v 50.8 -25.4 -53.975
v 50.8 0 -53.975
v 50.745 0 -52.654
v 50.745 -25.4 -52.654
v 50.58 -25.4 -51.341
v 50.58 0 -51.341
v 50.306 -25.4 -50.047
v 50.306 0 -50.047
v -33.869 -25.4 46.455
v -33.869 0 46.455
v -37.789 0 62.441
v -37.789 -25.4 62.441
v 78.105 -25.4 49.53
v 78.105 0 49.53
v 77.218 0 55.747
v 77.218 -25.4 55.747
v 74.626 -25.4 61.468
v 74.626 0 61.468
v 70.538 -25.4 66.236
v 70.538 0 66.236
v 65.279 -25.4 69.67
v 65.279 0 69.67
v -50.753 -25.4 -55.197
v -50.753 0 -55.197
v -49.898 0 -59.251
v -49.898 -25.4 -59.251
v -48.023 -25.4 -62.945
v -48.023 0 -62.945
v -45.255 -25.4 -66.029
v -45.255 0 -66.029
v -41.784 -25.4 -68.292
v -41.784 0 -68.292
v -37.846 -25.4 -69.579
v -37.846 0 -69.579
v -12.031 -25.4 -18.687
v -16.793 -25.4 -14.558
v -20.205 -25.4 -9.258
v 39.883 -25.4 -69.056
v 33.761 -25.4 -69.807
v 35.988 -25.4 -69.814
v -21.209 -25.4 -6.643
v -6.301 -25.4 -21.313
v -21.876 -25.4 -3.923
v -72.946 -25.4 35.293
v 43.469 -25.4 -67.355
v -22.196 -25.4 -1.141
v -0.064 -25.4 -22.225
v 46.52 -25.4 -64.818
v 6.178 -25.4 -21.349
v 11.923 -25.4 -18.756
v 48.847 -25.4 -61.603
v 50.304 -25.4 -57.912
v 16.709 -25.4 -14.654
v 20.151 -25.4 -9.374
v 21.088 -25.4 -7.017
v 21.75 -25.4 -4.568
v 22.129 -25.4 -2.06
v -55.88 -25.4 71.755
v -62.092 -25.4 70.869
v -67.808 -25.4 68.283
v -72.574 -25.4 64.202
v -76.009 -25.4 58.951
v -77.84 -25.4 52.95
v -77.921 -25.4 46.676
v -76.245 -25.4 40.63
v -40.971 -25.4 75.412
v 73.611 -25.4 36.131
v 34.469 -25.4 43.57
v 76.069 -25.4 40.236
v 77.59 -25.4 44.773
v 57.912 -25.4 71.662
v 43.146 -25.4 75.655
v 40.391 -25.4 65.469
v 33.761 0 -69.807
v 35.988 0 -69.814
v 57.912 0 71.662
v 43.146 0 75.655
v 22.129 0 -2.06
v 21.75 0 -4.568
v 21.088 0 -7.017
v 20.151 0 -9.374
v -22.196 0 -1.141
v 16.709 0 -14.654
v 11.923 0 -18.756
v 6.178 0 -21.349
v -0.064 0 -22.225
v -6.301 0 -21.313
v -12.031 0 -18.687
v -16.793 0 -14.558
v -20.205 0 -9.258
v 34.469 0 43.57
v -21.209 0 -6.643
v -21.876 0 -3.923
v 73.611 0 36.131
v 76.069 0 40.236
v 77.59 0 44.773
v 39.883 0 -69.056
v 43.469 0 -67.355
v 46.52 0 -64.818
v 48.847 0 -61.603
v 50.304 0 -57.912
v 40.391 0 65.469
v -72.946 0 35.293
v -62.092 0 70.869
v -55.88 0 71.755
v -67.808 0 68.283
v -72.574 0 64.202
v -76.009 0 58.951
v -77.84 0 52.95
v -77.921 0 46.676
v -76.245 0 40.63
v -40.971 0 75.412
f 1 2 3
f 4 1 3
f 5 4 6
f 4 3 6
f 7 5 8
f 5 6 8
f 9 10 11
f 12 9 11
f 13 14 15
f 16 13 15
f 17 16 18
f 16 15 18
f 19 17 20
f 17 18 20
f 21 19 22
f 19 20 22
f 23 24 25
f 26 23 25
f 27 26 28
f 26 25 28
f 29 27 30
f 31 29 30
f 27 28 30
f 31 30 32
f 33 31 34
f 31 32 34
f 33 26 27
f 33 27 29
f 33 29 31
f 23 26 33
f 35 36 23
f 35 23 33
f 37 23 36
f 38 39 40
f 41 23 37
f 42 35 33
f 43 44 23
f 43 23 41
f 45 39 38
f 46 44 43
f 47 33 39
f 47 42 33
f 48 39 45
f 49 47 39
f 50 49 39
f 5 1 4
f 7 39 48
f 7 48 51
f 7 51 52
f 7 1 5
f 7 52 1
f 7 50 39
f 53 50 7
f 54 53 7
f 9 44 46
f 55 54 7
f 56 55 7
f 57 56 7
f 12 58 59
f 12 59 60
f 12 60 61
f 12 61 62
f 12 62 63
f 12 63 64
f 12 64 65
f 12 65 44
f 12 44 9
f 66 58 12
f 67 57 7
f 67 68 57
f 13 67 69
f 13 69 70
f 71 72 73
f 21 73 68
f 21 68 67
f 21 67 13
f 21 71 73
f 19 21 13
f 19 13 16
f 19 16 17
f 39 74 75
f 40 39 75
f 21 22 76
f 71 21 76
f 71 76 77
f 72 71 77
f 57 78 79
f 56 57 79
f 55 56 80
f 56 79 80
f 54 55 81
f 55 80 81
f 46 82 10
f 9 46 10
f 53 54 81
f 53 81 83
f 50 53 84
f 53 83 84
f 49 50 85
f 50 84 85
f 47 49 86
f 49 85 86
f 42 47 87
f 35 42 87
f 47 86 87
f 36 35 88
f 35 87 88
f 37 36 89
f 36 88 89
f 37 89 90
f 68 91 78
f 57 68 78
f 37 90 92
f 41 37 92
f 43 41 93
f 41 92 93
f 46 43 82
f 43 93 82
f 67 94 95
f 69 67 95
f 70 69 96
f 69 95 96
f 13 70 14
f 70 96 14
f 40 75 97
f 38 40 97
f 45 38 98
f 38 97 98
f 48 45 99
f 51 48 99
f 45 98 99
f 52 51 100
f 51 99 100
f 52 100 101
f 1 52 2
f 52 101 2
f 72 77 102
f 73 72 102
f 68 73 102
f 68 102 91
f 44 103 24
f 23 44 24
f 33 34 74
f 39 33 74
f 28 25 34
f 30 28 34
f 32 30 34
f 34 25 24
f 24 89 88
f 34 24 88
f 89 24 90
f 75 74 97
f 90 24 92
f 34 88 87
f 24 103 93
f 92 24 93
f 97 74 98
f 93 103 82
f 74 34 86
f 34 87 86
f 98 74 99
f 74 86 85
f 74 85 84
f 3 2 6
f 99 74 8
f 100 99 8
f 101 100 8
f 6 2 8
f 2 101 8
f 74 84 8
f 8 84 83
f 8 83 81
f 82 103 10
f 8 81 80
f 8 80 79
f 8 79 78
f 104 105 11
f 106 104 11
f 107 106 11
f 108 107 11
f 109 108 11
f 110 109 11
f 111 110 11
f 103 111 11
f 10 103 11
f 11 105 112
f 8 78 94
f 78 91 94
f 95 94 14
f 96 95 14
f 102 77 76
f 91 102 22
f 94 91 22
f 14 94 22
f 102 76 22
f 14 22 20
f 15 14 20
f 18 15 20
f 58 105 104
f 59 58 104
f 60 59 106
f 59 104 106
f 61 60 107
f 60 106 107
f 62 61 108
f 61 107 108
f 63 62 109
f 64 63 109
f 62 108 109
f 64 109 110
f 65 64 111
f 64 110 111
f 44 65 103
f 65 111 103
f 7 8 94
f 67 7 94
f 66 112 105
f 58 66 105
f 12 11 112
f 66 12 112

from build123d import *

# Parameters (mm, degrees)
F1_DEPTH = 25.4


with BuildPart() as f1:
    # F0 (on Front) → F1 (new body)
    with BuildSketch(Plane.XZ):
        with BuildLine():
            ThreePointArc((-55.88, 71.755), (-45.7062069243, 69.2896700239), (-37.7894898478, 62.4406183985))
            Line((-37.7894898478, 62.4406183985), (-40.9707072614, 75.4116006232))
            Line((-40.9707072614, 75.4116006232), (-55.88, 71.755))
        make_face()
        with BuildLine():
            ThreePointArc((20.1514706795, -9.3738388323), (-0.0637628383, -22.224908533), (-20.2049252332, -9.2580571029))
            ThreePointArc((-20.2049252332, -9.2580571029), (-21.5852935507, -5.293933068), (-22.1956935913, -1.1409693254))
            Line((-22.1956935913, -1.1409693254), (-33.8688111264, 46.4545830573))
            ThreePointArc((-33.8688111264, 46.4545830573), (-49.7758218318, 28.1597020636), (-72.9459940838, 35.2926382032))
            Line((-72.9459940838, 35.2926382032), (-50.7529312723, -55.1965631947))
            ThreePointArc((-50.7529312723, -55.1965631947), (-35.536234837, -38.1117715463), (-19.05, -53.975))
            ThreePointArc((-19.05, -53.975), (-22.7428404887, -64.153929936), (-32.1033057816, -69.5972170878))
            Line((-32.1033057816, -69.5972170878), (33.760778806, -69.8072523354))
            ThreePointArc((33.760778806, -69.8072523354), (22.7534984393, -43.7833281666), (50.3064695665, -50.0474029008))
            Line((50.3064695665, -50.0474029008), (73.6114514871, 36.1305129516))
            ThreePointArc((73.6114514871, 36.1305129516), (51.7301219198, 27.695872197), (34.4690239948, 43.5700728609))
            Line((34.4690239948, 43.5700728609), (22.1293157515, -2.0600993596))
            ThreePointArc((22.1293157515, -2.0600993596), (21.4543450512, -5.8018706833), (20.1514706795, -9.3738388323))
        make_face()
        with BuildLine():
            Line((43.1457490814, 75.6551475002), (40.391048509, 65.4687266339))
            ThreePointArc((40.391048509, 65.4687266339), (48.4732019865, 70.4844737034), (57.912088459, 71.6619055098))
            Line((57.912088459, 71.6619055098), (43.1457490814, 75.6551475002))
        make_face()
        with BuildLine():
            Line((40.391048509, 65.4687266339), (34.4690239948, 43.5700728609))
            ThreePointArc((34.4690239948, 43.5700728609), (51.7301219198, 27.695872197), (73.6114514871, 36.1305129516))
            ThreePointArc((73.6114514871, 36.1305129516), (76.9516887589, 42.4635611621), (78.105, 49.53))
            ThreePointArc((78.105, 49.53), (74.6263449007, 61.4683909244), (65.2793372, 69.6695899958))
            Line((65.2793372, 69.6695899958), (57.912088459, 71.6619055098))
            ThreePointArc((57.912088459, 71.6619055098), (48.4732019865, 70.4844737034), (40.391048509, 65.4687266339))
        make_face()
        with BuildLine():
            ThreePointArc((50.8, -53.975), (50.6761341555, -51.9957582726), (50.3064695665, -50.0474029008))
            ThreePointArc((50.3064695665, -50.0474029008), (22.7534984393, -43.7833281666), (33.760778806, -69.8072523354))
            Line((33.760778806, -69.8072523354), (35.988222994, -69.8143554751))
            ThreePointArc((35.988222994, -69.8143554751), (46.5201345406, -64.8178999804), (50.8, -53.975))
        make_face()
        with BuildLine():
            ThreePointArc((-19.05, -53.975), (-35.536234837, -38.1117715463), (-50.7529312723, -55.1965631947))
            ThreePointArc((-50.7529312723, -55.1965631947), (-46.7400785083, -64.577808347), (-37.8462717948, -69.5789032329))
            Line((-37.8462717948, -69.5789032329), (-32.1033057816, -69.5972170878))
            ThreePointArc((-32.1033057816, -69.5972170878), (-22.7428404887, -64.153929936), (-19.05, -53.975))
        make_face()
        with BuildLine():
            ThreePointArc((-72.9459940838, 35.2926382032), (-49.7758218318, 28.1597020636), (-33.8688111264, 46.4545830573))
            Line((-33.8688111264, 46.4545830573), (-37.7894898478, 62.4406183985))
            ThreePointArc((-37.7894898478, 62.4406183985), (-45.7062069243, 69.2896700239), (-55.88, 71.755))
            ThreePointArc((-55.88, 71.755), (-76.0092820405, 58.9513921229), (-72.9459940838, 35.2926382032))
        make_face()
    extrude(amount=F1_DEPTH)


solid = f1.part
